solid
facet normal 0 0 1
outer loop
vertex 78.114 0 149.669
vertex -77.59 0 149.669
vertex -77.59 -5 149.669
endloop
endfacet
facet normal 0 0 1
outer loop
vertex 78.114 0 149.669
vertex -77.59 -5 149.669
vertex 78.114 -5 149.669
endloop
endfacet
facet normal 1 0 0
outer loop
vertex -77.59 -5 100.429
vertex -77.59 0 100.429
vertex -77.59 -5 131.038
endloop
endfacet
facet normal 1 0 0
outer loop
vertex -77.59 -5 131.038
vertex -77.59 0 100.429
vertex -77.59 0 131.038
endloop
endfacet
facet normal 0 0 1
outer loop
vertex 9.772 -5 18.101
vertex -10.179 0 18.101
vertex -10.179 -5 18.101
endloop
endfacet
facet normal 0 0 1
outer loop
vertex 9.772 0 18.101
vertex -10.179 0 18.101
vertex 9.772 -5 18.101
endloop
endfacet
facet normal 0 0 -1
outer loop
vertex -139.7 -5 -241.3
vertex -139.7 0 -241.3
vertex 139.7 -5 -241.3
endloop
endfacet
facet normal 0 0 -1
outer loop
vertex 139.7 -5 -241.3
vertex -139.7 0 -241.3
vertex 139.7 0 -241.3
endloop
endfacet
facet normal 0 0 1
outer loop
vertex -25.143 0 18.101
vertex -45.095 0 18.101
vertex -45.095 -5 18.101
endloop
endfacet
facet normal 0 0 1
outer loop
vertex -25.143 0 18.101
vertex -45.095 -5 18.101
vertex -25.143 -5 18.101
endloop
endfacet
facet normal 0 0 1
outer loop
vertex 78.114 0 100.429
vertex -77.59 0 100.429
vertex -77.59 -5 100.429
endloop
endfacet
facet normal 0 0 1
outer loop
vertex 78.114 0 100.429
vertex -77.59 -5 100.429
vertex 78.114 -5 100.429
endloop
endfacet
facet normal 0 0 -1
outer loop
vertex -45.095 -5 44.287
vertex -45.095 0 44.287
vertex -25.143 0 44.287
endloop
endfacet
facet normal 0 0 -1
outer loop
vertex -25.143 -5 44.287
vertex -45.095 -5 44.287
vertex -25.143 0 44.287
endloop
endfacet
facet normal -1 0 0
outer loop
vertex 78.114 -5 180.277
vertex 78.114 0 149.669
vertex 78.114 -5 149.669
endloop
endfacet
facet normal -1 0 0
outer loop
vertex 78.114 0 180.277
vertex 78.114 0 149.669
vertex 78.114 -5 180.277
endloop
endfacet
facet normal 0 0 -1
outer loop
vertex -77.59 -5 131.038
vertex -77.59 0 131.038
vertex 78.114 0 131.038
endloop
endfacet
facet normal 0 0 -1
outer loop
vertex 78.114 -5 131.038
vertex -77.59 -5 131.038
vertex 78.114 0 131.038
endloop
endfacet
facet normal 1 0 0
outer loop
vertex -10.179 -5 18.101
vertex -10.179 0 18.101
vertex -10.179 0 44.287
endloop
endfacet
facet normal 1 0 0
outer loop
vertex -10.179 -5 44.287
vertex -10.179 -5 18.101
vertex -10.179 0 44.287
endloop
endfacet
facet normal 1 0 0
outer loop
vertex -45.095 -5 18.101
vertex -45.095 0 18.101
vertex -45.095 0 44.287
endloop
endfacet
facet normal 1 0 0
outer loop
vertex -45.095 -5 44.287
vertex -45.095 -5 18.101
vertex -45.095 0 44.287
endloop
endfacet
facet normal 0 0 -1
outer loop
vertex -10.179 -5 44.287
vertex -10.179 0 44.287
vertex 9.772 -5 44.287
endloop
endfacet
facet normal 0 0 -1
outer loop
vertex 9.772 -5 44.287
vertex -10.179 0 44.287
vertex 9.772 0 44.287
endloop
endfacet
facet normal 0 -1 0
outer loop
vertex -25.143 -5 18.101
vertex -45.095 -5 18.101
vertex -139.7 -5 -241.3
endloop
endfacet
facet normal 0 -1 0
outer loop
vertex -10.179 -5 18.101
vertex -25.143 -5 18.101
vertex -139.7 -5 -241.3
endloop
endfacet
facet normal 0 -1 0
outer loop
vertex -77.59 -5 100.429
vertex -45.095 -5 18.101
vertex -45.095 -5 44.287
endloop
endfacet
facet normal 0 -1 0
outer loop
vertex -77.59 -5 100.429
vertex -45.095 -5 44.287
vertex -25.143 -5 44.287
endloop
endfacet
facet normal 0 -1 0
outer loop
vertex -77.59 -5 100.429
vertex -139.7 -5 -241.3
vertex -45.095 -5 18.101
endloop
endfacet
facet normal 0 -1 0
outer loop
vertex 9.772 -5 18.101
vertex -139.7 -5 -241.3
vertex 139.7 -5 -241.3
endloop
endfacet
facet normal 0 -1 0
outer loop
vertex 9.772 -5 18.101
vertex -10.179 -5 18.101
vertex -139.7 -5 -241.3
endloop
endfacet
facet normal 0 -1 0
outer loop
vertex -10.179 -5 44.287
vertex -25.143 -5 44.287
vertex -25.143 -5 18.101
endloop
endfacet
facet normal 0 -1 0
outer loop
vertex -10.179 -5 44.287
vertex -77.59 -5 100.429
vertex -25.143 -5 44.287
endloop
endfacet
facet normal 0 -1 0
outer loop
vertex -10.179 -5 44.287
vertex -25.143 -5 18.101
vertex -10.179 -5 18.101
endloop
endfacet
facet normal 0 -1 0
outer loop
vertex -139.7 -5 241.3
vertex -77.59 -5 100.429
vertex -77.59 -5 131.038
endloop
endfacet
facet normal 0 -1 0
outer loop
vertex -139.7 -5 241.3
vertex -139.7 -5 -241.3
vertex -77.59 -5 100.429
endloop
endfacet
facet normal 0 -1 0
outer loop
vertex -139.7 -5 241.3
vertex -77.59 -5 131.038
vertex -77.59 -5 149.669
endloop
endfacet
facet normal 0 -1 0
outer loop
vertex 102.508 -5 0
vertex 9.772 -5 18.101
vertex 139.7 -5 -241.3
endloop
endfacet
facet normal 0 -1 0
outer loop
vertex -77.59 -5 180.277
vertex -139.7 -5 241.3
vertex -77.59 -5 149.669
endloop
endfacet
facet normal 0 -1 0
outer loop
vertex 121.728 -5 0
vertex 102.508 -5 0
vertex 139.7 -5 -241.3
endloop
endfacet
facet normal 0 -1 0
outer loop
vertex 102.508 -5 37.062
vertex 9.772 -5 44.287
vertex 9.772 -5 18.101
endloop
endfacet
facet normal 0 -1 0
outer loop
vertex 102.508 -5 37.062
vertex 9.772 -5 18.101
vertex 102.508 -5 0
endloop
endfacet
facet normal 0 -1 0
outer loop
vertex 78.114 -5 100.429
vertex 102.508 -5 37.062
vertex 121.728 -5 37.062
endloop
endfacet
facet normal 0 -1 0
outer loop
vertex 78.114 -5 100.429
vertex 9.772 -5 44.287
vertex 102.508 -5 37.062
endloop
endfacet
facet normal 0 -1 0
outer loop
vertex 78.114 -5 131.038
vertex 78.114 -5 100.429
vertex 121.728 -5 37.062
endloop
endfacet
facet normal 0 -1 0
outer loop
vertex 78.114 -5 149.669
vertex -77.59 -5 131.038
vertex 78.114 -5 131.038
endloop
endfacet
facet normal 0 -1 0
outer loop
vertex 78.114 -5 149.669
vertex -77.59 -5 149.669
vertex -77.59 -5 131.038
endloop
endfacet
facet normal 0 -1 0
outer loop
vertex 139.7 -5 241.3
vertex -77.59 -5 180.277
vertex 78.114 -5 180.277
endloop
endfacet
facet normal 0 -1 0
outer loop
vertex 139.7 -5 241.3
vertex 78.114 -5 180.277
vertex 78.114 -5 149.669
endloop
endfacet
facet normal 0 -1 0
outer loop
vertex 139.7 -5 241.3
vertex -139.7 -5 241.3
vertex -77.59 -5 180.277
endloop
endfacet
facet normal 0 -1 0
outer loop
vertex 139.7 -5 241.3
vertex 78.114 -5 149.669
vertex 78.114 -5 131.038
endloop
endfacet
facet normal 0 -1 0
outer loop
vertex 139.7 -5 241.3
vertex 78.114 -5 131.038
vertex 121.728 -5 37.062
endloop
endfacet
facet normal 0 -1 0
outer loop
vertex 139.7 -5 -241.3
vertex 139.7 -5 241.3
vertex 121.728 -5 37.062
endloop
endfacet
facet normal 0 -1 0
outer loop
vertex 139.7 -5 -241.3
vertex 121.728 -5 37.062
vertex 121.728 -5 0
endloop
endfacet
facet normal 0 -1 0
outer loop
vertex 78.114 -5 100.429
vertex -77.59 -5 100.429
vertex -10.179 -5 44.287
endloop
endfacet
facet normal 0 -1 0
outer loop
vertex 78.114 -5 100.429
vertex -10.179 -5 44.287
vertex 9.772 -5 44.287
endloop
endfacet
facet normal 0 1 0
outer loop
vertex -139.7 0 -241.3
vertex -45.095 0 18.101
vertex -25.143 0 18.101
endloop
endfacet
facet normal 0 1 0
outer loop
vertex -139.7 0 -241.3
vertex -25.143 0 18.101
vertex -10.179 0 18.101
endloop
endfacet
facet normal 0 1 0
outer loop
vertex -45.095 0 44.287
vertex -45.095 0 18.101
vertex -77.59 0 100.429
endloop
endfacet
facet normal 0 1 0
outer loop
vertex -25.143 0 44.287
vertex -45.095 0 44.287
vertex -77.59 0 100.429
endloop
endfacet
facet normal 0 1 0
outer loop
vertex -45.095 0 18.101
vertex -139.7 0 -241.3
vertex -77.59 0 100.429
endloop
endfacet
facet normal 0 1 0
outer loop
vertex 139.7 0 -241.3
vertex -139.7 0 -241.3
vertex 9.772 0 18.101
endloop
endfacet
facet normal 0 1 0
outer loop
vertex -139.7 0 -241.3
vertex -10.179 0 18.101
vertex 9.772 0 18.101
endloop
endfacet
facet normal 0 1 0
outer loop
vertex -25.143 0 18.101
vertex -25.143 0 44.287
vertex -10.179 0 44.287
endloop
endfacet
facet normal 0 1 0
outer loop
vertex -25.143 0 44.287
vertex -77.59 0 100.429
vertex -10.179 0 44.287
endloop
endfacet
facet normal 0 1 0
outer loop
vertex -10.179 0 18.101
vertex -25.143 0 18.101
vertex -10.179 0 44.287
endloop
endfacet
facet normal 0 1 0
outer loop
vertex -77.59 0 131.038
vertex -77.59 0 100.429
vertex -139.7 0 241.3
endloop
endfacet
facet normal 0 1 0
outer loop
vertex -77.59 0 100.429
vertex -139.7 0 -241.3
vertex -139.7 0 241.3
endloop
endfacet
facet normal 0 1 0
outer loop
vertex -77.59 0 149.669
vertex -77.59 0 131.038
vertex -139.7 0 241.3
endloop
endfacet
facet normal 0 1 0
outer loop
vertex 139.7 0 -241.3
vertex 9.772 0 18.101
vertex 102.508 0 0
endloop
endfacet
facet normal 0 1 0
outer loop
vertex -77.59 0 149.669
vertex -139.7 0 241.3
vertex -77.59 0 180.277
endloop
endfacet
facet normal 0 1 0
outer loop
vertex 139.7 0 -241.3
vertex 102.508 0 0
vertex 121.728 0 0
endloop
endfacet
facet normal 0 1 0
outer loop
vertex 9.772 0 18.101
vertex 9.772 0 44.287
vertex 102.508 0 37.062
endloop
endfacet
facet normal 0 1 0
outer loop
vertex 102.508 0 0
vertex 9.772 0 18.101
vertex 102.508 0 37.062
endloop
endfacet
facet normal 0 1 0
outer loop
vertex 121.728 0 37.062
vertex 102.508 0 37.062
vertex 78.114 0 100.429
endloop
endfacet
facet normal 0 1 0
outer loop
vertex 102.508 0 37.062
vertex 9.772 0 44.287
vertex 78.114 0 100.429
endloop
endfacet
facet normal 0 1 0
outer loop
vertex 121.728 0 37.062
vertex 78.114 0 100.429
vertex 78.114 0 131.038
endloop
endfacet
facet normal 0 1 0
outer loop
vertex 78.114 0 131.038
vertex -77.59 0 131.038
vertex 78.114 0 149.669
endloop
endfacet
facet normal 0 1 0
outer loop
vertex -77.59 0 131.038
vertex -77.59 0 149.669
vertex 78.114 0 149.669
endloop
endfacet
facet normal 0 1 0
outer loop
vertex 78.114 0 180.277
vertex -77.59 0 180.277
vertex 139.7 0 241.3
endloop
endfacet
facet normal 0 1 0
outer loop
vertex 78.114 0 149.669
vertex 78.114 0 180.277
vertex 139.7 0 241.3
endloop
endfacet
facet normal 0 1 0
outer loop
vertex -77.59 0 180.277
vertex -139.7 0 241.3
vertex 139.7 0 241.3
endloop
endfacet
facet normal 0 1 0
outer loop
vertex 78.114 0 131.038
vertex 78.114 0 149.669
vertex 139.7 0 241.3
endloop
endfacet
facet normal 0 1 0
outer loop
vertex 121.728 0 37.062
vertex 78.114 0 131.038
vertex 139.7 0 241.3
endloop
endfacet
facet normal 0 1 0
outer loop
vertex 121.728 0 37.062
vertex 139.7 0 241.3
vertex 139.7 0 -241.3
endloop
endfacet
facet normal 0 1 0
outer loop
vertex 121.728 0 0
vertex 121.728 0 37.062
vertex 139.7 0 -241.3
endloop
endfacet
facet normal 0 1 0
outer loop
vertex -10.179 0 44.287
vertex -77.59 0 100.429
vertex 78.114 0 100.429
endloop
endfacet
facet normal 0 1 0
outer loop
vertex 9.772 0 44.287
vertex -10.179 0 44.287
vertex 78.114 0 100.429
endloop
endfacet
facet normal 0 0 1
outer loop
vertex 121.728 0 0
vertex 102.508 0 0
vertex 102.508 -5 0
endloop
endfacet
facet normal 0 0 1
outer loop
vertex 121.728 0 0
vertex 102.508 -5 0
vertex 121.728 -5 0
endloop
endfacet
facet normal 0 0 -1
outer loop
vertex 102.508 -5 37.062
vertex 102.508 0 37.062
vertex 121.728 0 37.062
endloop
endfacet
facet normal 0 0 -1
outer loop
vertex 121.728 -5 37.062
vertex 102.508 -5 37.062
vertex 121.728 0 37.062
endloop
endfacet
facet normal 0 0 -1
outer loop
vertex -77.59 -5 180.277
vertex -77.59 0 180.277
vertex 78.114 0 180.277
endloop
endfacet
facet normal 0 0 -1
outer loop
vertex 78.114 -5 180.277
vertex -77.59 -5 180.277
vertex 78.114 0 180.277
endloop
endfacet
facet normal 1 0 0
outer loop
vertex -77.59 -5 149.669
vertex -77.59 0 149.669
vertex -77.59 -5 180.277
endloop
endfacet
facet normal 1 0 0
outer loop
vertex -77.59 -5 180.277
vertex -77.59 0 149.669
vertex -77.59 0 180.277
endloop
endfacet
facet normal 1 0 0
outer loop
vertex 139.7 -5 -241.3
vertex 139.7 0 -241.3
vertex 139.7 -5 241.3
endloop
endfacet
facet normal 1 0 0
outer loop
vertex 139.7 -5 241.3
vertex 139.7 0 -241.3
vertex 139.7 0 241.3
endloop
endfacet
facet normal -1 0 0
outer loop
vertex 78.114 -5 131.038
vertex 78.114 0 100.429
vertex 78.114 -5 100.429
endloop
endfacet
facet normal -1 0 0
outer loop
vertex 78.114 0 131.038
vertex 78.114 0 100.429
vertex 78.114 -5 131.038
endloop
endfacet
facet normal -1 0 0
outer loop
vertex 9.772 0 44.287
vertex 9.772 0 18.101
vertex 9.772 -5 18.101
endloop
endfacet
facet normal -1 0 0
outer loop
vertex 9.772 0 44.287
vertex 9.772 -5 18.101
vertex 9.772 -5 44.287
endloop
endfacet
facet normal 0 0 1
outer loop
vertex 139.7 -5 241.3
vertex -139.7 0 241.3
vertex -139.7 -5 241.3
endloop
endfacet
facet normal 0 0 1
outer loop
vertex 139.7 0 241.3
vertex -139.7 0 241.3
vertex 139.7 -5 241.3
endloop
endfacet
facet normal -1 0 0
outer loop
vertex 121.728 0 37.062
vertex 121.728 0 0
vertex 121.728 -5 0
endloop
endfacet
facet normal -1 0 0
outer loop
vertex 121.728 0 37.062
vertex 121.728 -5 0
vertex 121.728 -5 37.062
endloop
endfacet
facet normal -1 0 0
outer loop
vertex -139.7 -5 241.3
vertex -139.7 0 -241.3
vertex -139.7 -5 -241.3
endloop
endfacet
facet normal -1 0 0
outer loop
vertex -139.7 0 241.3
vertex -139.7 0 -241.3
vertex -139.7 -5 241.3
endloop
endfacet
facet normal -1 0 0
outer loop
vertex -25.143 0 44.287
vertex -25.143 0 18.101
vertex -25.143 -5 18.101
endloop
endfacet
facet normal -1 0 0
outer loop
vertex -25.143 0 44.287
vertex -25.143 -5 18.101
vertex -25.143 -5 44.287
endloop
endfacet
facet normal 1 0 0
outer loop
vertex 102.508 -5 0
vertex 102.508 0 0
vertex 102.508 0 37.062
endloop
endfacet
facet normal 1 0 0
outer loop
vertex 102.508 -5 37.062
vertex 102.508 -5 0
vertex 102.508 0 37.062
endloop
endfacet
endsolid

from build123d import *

# Parameters (mm, degrees)
F0_W     = 279.4
F0_H     = 482.6
F0_W_2   = 19.951616
F0_H_2   = 26.186477
F0_W_3   = 19.951598
F0_W_4   = 155.703895
F0_H_3   = 30.60846
F0_W_5   = 19.220256
F0_H_4   = 37.062008
F1_DEPTH = 5


with BuildPart() as f1:
    # F0 (on Front) → F1 (new body)
    with BuildSketch(Plane.XZ):
        Rectangle(F0_W, F0_H)
        with Locations((-35.118891, 31.193768)):
            Rectangle(F0_W_2, F0_H_2, mode=Mode.SUBTRACT)
        with Locations((-0.203586, 31.193768)):
            Rectangle(F0_W_3, F0_H_2, mode=Mode.SUBTRACT)
        with Locations((0.261803, 115.733497)):
            Rectangle(F0_W_4, F0_H_3, mode=Mode.SUBTRACT)
        with Locations((112.11833, 18.531004)):
            Rectangle(F0_W_5, F0_H_4, mode=Mode.SUBTRACT)
        with Locations((0.261803, 164.973207)):
            Rectangle(F0_W_4, F0_H_3, mode=Mode.SUBTRACT)
    extrude(amount=F1_DEPTH)


solid = f1.part
